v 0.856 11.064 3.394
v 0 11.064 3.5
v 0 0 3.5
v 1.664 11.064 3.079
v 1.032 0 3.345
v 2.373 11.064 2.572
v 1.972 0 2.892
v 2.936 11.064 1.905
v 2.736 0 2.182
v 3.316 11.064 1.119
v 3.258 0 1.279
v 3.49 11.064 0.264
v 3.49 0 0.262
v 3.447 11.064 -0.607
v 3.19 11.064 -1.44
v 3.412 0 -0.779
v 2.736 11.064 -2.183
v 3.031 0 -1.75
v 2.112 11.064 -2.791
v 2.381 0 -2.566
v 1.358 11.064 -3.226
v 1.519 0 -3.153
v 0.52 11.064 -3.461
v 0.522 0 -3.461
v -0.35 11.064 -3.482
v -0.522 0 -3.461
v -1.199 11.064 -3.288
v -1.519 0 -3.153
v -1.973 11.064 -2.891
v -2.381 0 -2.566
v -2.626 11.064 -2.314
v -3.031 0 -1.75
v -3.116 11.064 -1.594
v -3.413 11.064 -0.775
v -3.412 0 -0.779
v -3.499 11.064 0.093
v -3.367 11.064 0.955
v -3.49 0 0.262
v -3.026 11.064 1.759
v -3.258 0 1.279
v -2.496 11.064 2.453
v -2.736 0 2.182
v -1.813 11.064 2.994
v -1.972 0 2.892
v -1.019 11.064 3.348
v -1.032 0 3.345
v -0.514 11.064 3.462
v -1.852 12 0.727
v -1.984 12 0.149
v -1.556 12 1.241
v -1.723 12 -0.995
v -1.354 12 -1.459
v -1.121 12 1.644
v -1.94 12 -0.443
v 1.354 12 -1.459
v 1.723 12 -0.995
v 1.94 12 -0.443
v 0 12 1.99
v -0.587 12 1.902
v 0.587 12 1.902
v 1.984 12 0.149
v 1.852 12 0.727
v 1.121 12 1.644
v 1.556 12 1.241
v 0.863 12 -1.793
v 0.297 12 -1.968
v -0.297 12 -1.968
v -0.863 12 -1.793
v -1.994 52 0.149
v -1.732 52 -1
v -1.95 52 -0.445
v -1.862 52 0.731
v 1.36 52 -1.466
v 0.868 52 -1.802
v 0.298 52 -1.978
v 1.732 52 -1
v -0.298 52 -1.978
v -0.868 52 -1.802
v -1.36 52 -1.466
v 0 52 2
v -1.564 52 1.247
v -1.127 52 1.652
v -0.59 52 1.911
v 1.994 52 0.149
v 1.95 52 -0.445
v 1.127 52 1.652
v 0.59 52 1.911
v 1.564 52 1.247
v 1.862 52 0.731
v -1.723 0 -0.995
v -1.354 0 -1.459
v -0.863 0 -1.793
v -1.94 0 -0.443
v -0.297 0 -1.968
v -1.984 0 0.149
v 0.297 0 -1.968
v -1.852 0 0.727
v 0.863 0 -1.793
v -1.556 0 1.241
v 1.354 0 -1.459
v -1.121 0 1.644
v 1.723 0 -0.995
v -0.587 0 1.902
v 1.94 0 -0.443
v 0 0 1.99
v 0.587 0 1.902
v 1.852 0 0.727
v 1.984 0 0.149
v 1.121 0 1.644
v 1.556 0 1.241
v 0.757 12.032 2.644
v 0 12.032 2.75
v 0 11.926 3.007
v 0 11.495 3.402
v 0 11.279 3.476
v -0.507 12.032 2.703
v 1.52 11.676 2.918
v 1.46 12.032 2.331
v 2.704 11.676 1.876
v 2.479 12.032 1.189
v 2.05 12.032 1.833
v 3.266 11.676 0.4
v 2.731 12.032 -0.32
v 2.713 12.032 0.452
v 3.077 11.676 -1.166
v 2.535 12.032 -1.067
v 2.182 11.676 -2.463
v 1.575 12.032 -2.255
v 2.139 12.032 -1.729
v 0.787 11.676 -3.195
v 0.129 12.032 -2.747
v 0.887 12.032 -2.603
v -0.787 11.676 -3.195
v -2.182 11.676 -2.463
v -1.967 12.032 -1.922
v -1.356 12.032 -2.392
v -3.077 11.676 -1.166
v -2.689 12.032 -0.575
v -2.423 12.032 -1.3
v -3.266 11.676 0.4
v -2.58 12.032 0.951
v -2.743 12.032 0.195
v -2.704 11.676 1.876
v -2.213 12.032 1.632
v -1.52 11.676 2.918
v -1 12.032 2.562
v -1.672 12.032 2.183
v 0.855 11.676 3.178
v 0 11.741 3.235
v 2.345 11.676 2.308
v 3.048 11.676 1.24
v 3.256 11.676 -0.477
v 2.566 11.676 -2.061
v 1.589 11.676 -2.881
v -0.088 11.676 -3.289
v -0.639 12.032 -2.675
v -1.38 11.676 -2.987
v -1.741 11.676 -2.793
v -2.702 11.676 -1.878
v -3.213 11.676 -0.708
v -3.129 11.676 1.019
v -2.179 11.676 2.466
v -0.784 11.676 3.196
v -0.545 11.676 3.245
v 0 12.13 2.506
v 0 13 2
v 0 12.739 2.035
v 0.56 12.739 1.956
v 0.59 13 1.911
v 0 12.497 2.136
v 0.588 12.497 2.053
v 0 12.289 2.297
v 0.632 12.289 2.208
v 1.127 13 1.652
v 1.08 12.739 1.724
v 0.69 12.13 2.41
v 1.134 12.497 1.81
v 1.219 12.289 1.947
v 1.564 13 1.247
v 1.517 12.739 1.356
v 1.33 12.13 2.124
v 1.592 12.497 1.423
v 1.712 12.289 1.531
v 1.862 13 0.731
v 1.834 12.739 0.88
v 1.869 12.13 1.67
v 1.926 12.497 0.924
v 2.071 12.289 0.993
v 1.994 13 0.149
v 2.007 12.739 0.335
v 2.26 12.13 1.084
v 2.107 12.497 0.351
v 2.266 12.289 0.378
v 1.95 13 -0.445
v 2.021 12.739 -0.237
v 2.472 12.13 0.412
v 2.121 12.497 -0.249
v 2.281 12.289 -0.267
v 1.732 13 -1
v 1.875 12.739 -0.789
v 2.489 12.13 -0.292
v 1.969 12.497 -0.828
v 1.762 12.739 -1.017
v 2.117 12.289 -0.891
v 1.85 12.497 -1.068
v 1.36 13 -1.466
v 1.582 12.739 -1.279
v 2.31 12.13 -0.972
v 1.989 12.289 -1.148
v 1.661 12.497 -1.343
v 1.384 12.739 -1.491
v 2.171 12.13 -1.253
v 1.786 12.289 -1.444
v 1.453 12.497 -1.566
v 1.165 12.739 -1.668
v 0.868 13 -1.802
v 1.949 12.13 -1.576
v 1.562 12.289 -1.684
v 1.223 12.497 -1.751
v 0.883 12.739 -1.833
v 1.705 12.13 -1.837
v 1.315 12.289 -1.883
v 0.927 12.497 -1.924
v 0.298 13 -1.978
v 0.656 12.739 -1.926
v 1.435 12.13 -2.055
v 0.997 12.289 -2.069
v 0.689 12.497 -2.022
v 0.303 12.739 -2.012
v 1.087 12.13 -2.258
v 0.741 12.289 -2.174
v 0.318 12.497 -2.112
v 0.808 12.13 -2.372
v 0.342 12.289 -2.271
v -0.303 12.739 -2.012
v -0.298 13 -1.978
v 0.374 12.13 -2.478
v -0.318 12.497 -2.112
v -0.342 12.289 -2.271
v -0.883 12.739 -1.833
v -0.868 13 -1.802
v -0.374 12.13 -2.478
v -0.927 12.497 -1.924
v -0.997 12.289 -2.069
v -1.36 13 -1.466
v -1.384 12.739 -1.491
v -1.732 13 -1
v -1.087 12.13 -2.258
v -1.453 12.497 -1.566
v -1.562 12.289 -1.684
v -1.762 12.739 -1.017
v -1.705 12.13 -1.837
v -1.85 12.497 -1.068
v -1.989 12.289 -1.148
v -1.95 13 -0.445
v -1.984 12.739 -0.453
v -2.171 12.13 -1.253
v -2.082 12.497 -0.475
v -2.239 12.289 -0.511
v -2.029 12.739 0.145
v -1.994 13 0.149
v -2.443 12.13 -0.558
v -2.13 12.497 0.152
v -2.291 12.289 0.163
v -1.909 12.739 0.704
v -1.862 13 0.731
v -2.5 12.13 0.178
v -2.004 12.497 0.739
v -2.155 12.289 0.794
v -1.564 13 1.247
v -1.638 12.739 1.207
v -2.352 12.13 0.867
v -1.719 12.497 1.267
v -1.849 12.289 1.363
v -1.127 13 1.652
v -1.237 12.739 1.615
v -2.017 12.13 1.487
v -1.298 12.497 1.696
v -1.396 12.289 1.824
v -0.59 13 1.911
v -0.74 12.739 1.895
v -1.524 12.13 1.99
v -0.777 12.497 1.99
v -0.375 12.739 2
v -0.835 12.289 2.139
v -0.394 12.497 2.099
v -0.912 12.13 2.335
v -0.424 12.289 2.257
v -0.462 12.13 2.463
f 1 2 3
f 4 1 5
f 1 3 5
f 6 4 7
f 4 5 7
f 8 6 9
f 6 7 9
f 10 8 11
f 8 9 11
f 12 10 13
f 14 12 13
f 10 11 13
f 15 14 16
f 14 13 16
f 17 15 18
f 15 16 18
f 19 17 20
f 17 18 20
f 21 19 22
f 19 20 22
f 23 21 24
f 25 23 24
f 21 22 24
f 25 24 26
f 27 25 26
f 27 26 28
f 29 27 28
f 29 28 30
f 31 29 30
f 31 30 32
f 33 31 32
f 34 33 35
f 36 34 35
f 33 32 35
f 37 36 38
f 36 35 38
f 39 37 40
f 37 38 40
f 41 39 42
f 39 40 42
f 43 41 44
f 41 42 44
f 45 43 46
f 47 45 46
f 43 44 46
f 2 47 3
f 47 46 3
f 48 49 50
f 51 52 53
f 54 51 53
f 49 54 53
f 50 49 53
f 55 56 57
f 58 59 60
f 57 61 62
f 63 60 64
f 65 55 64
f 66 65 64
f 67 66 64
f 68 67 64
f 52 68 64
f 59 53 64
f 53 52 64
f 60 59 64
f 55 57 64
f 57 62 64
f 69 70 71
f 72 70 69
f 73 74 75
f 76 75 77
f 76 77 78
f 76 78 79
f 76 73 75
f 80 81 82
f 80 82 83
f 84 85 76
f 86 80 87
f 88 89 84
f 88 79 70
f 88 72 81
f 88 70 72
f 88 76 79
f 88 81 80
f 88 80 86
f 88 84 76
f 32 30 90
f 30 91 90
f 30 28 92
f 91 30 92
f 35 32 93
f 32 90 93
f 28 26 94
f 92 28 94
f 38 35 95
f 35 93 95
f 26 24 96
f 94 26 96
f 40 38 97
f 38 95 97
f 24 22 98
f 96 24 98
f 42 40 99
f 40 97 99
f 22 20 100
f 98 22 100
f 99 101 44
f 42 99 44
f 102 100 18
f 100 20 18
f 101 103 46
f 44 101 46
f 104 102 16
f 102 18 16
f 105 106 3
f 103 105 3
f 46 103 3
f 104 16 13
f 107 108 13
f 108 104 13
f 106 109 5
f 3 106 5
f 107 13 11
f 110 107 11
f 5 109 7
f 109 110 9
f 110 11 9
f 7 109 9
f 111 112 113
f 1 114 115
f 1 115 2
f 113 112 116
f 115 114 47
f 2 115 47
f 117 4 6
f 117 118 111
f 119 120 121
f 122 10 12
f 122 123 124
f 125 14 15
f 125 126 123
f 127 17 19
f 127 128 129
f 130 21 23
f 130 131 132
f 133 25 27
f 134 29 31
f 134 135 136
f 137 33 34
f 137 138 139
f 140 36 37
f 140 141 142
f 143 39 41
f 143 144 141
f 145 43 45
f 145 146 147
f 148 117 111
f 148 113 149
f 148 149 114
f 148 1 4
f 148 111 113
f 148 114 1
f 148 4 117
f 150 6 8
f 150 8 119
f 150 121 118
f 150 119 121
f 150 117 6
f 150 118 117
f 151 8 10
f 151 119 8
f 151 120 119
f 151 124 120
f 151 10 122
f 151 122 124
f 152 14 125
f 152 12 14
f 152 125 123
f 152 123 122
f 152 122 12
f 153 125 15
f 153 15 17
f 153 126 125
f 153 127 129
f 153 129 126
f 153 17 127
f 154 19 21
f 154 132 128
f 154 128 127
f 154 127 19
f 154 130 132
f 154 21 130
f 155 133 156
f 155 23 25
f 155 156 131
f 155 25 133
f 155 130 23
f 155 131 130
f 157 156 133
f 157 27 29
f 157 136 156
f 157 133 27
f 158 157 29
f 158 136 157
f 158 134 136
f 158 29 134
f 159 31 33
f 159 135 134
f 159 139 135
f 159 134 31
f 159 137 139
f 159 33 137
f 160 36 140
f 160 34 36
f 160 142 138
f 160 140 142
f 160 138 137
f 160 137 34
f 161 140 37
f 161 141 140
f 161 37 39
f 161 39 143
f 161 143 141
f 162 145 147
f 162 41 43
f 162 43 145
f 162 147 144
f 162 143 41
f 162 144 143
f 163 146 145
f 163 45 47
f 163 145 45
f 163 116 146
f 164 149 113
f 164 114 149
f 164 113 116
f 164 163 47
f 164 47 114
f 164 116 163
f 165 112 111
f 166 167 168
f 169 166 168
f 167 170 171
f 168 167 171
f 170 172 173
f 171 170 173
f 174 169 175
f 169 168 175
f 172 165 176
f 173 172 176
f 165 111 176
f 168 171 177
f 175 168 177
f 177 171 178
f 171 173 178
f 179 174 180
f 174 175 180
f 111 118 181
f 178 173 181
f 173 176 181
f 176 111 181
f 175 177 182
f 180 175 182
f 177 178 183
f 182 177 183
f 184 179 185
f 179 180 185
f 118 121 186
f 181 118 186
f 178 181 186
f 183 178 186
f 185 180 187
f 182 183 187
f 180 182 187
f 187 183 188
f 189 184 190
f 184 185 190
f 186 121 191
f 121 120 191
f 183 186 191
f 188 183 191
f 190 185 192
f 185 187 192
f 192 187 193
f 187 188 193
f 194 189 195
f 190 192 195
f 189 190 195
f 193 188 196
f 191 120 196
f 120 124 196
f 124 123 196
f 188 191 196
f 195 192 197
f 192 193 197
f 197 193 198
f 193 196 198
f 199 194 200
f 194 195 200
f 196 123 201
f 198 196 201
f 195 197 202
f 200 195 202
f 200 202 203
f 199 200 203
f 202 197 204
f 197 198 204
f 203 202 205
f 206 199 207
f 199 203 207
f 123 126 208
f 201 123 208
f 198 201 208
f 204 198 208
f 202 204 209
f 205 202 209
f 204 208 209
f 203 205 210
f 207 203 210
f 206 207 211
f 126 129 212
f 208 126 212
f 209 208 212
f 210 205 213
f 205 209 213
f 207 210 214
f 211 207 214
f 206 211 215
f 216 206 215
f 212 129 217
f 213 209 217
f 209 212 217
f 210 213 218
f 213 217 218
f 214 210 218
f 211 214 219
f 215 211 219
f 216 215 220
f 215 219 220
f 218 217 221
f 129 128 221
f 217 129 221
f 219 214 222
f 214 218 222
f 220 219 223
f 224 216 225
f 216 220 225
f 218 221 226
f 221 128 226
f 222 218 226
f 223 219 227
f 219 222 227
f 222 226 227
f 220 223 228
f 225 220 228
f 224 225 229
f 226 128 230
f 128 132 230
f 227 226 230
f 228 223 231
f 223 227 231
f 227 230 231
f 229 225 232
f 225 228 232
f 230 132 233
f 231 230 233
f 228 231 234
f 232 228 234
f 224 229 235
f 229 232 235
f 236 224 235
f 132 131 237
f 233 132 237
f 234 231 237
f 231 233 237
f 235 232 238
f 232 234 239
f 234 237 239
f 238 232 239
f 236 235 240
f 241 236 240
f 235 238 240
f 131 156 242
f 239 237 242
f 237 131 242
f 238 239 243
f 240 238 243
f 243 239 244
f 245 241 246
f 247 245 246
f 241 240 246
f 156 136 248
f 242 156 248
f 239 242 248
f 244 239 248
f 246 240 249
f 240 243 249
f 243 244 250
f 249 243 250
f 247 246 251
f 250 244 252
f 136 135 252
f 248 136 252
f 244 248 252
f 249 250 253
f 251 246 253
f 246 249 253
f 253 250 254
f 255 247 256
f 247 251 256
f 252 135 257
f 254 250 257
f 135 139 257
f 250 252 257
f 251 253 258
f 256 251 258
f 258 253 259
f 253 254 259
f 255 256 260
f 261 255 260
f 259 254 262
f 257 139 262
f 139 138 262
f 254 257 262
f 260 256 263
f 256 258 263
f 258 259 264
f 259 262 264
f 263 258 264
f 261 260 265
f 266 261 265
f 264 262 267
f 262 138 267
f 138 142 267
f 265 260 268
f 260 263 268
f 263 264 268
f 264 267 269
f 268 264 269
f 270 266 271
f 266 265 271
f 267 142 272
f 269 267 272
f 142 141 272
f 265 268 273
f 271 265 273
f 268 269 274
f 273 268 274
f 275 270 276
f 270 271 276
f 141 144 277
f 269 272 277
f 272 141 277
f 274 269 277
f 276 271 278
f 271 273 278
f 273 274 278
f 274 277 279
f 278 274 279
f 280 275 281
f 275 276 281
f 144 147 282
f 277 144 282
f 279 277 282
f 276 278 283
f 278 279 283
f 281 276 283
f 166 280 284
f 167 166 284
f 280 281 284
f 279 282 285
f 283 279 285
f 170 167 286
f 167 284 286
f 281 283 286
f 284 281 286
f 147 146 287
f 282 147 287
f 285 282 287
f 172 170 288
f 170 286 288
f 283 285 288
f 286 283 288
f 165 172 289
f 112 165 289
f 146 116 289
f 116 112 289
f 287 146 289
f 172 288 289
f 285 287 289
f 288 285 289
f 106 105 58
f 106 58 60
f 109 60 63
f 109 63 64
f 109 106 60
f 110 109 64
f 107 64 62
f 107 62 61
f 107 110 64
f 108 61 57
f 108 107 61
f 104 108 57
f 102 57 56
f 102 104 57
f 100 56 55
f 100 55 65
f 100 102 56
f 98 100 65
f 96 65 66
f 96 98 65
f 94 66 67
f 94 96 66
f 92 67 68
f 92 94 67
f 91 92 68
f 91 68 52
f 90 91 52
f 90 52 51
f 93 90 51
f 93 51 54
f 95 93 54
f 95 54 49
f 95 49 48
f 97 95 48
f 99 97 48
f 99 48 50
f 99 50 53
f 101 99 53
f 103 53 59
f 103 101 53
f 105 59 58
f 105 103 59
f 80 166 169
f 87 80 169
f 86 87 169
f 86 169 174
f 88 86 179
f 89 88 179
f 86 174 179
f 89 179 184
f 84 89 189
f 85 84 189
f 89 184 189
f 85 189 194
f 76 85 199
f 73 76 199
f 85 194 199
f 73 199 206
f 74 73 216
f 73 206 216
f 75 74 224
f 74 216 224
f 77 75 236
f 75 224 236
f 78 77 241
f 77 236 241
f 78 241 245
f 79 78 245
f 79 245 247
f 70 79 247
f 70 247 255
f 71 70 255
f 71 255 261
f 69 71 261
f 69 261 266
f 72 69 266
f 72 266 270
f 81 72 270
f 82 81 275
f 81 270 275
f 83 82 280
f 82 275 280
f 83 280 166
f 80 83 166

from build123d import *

# Parameters (mm, degrees)
SKETCH_1_R      = 3.5
SKETCH_1_R_2    = 1.99
EXTRUDE_1_DEPTH = 12
SKETCH_2_R      = 2
EXTRUDE_2_DEPTH = 40
FILLET_1_R      = 1
FILLET_2_R      = 1


with BuildPart() as part:
    # Эскиз1 → Вытянуть1 (new body)
    with BuildSketch(Plane(origin=(0, 0, 0), x_dir=(1, 0, 0), z_dir=(0, 1, 0))):
        with Locations(Location((0, 0, 0), (0, 0, 270))):
            Circle(SKETCH_1_R)
        with Locations(Location((0, 0, 0), (0, 0, 270))):
            Circle(SKETCH_1_R_2, mode=Mode.SUBTRACT)
    extrude(amount=EXTRUDE_1_DEPTH)

    # Эскиз2 → Вытянуть2 (add)
    with BuildSketch(Plane(origin=(0, 12, 0), x_dir=(1, 0, 0), z_dir=(0, 1, 0))):
        with Locations(Location((0, 0, 0), (0, 0, 270))):
            Circle(SKETCH_2_R)
    extrude(amount=EXTRUDE_2_DEPTH)

    # Скругление1
    fillet_1_edges = [part.edges().sort_by_distance(p)[0] for p in [
        (0, 12, -2),
    ]]
    fillet(fillet_1_edges, radius=FILLET_1_R)

    # Скругление2
    fillet_2_edges = [part.edges().sort_by_distance(p)[0] for p in [
        (0, 12, -3.5),
    ]]
    fillet(fillet_2_edges, radius=FILLET_2_R)


solid = part.part
